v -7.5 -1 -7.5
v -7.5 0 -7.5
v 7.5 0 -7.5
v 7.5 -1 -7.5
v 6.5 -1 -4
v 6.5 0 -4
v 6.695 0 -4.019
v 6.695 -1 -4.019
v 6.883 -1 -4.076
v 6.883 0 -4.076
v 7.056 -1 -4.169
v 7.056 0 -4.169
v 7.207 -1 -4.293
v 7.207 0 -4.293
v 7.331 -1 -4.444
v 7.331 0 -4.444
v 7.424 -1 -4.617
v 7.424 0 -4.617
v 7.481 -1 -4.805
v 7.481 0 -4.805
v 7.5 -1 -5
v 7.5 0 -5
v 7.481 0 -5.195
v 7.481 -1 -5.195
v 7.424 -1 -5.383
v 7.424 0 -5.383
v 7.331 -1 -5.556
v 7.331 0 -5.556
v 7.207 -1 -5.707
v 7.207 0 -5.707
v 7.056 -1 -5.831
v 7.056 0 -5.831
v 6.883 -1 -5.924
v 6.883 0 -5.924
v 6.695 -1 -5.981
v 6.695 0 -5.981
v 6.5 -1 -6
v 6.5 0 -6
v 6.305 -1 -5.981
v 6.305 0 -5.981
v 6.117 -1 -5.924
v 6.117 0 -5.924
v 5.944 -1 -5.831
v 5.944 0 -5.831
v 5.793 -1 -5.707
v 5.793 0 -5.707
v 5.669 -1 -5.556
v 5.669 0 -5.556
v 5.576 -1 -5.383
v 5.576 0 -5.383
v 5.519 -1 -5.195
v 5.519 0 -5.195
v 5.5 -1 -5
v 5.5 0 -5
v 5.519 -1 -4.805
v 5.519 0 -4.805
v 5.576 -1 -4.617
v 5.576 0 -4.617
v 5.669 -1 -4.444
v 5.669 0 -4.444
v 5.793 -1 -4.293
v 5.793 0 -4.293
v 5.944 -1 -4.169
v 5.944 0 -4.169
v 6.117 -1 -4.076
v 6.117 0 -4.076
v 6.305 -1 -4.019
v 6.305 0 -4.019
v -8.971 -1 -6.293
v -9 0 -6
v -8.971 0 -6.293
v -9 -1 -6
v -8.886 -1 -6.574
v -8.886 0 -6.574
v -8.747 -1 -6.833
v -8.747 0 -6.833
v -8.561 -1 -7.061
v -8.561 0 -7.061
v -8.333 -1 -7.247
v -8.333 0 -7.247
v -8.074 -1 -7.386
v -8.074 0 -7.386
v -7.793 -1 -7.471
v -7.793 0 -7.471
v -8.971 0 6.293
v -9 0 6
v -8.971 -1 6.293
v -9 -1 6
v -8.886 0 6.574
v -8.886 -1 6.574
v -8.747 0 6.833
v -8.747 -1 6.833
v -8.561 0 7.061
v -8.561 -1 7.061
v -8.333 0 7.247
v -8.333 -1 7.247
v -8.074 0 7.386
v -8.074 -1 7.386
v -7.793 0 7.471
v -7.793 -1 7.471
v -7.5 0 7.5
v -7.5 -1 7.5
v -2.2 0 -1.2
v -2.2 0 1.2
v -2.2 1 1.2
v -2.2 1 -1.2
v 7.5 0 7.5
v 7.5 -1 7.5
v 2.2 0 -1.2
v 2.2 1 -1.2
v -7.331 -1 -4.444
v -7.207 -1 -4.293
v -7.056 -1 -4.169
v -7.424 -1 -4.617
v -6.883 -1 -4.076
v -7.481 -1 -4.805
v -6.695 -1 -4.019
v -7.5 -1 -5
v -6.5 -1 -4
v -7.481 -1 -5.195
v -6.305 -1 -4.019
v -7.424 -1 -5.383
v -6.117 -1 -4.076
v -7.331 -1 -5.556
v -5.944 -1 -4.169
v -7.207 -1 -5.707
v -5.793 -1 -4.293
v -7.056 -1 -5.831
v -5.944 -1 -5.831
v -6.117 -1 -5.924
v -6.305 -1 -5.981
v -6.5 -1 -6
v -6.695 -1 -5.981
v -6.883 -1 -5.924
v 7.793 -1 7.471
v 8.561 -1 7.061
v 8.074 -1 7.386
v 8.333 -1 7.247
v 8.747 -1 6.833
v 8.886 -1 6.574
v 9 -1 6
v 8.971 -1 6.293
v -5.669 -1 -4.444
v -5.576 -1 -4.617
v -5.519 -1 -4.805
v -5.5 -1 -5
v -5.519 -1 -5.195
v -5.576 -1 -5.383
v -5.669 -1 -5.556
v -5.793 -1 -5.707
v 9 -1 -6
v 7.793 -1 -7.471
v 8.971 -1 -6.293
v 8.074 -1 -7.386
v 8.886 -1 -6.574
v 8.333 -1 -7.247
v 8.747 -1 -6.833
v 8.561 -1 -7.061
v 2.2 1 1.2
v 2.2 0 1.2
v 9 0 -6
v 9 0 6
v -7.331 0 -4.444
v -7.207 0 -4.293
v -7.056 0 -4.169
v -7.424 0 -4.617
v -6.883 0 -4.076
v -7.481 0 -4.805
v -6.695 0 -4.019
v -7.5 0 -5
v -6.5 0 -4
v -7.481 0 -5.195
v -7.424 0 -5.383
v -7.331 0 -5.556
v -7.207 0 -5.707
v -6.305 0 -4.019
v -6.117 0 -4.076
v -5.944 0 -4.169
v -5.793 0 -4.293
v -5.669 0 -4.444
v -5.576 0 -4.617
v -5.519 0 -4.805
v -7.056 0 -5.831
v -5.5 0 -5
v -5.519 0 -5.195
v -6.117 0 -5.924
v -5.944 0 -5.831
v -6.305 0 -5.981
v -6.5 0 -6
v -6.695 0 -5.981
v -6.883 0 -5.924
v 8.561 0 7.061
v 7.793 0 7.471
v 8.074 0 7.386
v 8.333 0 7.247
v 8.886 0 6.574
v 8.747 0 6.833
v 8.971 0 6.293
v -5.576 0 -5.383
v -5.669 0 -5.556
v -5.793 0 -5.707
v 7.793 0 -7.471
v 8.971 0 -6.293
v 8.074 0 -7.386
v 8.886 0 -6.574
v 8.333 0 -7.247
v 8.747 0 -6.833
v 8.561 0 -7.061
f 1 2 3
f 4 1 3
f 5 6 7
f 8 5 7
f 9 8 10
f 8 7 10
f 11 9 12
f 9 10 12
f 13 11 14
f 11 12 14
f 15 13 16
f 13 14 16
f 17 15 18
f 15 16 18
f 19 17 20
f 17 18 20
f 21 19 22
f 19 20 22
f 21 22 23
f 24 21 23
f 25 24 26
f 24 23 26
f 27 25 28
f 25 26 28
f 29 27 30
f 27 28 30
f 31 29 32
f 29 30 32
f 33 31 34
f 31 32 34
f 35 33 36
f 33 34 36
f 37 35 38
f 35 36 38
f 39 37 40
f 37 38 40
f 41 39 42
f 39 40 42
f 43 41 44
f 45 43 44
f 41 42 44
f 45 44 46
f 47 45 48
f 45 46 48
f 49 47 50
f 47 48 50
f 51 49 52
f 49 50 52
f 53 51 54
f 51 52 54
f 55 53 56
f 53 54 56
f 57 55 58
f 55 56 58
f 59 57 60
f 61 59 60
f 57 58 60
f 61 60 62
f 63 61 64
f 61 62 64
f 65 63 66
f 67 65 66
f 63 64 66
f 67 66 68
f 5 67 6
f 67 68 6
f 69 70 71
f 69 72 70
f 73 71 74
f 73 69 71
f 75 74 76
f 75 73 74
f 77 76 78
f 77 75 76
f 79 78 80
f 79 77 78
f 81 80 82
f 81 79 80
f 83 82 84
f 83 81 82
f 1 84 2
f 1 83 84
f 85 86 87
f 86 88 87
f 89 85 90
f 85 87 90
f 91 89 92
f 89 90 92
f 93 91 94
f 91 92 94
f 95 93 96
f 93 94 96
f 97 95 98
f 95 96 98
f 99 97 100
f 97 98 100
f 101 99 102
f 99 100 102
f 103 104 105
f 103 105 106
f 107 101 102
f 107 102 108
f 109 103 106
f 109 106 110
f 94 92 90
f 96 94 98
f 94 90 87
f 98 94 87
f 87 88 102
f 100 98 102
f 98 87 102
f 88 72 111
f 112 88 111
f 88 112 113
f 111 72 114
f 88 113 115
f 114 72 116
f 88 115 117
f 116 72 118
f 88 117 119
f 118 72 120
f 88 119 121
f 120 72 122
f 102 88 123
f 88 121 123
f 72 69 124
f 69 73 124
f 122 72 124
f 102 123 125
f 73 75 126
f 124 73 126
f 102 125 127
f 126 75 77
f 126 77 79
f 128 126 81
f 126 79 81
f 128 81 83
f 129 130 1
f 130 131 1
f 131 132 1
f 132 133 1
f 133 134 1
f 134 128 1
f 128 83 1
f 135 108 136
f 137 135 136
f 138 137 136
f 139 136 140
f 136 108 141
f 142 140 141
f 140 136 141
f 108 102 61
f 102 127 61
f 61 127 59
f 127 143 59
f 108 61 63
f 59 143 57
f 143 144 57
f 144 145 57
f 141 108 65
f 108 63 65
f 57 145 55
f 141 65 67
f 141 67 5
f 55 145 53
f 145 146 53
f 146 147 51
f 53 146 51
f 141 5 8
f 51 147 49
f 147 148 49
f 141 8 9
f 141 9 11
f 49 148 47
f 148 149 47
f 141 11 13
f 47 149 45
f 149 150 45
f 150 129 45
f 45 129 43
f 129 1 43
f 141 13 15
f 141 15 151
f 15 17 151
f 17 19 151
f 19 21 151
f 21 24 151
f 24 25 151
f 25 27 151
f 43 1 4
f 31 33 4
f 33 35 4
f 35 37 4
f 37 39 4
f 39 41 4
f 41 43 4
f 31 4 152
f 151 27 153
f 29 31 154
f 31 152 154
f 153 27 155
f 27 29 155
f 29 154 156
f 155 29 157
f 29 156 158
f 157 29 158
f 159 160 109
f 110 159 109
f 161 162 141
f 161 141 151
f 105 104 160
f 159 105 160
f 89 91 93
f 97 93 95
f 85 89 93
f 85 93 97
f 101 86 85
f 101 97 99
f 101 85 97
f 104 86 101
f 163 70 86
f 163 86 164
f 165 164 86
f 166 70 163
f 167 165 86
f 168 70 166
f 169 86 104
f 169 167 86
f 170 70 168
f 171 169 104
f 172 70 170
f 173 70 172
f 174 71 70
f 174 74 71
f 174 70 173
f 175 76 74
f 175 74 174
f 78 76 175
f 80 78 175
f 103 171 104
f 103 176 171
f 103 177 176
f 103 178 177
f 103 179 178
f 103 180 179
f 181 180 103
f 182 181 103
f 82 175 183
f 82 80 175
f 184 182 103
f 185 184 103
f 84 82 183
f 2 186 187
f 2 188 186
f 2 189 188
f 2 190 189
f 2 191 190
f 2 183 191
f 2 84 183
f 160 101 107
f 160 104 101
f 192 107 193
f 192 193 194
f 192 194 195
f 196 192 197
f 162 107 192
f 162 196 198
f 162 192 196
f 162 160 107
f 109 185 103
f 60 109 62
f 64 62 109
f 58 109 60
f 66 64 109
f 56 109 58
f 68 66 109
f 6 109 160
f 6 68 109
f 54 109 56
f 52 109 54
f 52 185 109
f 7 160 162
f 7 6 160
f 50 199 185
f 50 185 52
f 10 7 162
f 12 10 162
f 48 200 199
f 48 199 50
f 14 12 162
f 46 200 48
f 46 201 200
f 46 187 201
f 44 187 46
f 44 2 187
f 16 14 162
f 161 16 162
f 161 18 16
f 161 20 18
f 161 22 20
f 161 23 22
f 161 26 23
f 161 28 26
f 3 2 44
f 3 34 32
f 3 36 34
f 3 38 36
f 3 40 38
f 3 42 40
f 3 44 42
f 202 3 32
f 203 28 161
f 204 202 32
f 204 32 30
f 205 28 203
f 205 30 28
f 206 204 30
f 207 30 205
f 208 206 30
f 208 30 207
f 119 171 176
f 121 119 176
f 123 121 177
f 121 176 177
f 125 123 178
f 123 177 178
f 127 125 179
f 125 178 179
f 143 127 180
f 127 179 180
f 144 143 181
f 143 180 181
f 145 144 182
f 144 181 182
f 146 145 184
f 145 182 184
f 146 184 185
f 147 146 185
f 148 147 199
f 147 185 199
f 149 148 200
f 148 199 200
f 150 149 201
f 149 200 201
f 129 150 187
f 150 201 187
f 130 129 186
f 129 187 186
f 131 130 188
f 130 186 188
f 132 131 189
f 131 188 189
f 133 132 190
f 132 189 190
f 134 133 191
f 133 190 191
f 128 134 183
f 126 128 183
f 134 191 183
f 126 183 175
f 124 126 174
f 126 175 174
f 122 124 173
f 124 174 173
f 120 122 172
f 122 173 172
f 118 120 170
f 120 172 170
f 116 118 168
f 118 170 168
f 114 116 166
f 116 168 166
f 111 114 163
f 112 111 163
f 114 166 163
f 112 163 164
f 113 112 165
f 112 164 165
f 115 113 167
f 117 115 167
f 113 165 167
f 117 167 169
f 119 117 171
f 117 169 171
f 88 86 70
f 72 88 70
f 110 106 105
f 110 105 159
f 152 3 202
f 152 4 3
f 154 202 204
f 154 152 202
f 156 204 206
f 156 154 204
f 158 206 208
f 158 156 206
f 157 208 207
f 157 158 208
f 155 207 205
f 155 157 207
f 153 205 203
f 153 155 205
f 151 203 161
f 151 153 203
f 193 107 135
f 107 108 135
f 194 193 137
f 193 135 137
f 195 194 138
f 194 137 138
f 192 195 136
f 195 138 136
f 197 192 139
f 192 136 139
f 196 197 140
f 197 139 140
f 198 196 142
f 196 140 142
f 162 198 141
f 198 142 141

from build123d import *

# Parameters (mm, degrees)
SKETCH1_W           = 18
SKETCH1_H           = 15
SKETCH1_R           = 1
BOSS_EXTRUDE1_DEPTH = 1
SKETCH1_4_W         = 4.4
SKETCH1_4_H         = 2.4
BOSS_EXTRUDE2_DEPTH = 1
FILLET1_R           = 1.5


with BuildPart() as part:
    # Sketch1 → Boss-Extrude1 (new body)
    with BuildSketch(Plane(origin=(0, 0, 0), x_dir=(1, 0, 0), z_dir=(0, 1, 0))):
        Rectangle(SKETCH1_W, SKETCH1_H)
        with Locations((-6.5, 5)):
            Circle(SKETCH1_R, mode=Mode.SUBTRACT)
        with Locations((6.5, 5)):
            Circle(SKETCH1_R, mode=Mode.SUBTRACT)
    extrude(amount=-BOSS_EXTRUDE1_DEPTH)

    # Sketch1<4> → Boss-Extrude2 (add)
    with BuildSketch(Plane(origin=(0, 0, 0), x_dir=(1, 0, 0), z_dir=(0, 1, 0))):
        Rectangle(SKETCH1_4_W, SKETCH1_4_H)
    extrude(amount=BOSS_EXTRUDE2_DEPTH)

    # Fillet1
    fillet1_edges = [part.edges().sort_by_distance(p)[0] for p in [
        (-9, -0.5, -7.5),
        (9, -0.5, -7.5),
        (9, -0.5, 7.5),
        (-9, -0.5, 7.5),
    ]]
    fillet(fillet1_edges, radius=FILLET1_R)


solid = part.part
